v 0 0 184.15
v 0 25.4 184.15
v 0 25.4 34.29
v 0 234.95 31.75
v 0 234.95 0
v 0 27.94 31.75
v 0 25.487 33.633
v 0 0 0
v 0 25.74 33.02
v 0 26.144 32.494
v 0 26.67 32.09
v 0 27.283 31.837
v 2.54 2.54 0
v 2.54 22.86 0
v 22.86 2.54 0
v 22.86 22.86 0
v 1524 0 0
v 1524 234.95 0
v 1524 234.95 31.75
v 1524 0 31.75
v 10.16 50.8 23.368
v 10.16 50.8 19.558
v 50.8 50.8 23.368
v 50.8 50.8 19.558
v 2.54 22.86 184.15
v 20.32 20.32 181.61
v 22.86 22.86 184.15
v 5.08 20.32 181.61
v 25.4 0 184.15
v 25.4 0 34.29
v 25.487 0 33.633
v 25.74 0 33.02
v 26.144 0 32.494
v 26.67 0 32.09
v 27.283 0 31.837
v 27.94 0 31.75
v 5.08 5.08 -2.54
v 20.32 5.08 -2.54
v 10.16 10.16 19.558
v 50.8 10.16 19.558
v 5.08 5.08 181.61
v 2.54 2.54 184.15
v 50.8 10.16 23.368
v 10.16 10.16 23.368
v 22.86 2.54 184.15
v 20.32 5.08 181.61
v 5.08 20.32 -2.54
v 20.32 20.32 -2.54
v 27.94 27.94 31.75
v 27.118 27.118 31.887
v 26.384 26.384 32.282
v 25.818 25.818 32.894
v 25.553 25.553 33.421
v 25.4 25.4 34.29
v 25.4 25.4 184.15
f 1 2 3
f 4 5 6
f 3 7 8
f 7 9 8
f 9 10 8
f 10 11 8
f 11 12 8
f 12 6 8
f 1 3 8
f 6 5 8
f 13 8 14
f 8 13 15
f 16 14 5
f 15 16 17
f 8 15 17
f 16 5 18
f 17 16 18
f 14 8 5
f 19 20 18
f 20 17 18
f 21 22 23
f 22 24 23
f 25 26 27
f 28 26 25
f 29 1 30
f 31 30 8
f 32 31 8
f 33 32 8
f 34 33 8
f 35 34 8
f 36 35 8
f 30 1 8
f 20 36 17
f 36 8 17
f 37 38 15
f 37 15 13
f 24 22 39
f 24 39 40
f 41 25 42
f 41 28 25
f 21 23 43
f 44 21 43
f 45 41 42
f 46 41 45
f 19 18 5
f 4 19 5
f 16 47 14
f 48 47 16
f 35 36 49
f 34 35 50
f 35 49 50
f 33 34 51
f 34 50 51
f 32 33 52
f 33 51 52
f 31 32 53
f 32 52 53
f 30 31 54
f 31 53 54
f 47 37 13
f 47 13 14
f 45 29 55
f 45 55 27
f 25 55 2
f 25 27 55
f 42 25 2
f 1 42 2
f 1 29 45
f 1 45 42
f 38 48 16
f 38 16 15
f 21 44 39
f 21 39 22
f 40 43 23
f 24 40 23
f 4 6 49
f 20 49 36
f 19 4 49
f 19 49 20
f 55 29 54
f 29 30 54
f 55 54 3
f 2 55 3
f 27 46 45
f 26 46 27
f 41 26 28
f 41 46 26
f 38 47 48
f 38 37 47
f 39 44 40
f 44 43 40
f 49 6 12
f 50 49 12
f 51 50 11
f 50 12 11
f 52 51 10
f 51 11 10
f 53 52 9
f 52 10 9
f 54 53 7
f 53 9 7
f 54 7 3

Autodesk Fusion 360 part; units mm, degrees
sketch "Sketch1" plane through (0, 0, 0) normal (0, 0, 1) x (1, 0, 0)
  line L0 (0, 0) -> (50.8, 0)
  line L1 (50.8, 0) -> (50.8, 50.8)
  line L2 (50.8, 50.8) -> (0, 50.8)
  line L3 (0, 50.8) -> (0, 0)
  dimension "d1" = 50.8
  dimension "d2" = 50.8
extrude "Extrude1" add sketch "Sketch1" along normal blind 31.75
sketch "Sketch2" plane through (50.8, 0, 0) normal (1, 0, 0) x (0, 1, 0)
  line L0 (0, 0) -> (50.8, 0)
  line L1 (50.8, 0) -> (50.8, 31.75)
  line L2 (50.8, 31.75) -> (0, 31.75)
  line L3 (0, 31.75) -> (0, 0)
  line L4 (50.8, 23.368) -> (10.16, 23.368)
  line L5 (10.16, 23.368) -> (10.16, 3.81)
  line L6 (10.16, 3.81) -> (50.8, 3.81)
  line L7 (50.8, 3.81) -> (50.8, 23.368)
  dimension "d5" = 40.64
  dimension "d6" = 19.558
  dimension "d14" = 3.81
extrude "Extrude2" cut sketch "Sketch2" against normal blind 40.64 contours L1 L4 L5 L6 L7
sketch "Sketch3" plane through (0, 0, 31.75) normal (0, 0, 1) x (-1, 0, 0)
  line L0 (0, -50.8) -> (0, 0)
  line L1 (0, 0) -> (-50.8, 0)
  line L2 (-50.8, 0) -> (-50.8, -50.8)
  line L3 (-50.8, -50.8) -> (0, -50.8)
  line L4 (0, 0) -> (-25.4, 0)
  line L5 (-25.4, 0) -> (-25.4, -25.4)
  line L6 (-25.4, -25.4) -> (0, -25.4)
  line L7 (0, -25.4) -> (0, 0)
  dimension "d10" = 25.4
  dimension "d11" = 25.4
extrude "Extrude3" add sketch "Sketch3" along normal blind 152.4 contours L0 L1 L4 L5 L6 L7
fillet "Fillet1" radius 2.54 2 edges at (25.4, 12.7, 31.75) (12.7, 25.4, 31.75)
sketch "Sketch4" plane through (0, 0, 0) normal (0, 0, -1) x (1, 0, 0)
  line L0 (0, 0) -> (0, -50.8)
  line L1 (0, -50.8) -> (50.8, -50.8)
  line L2 (50.8, -50.8) -> (50.8, 0)
  line L3 (50.8, 0) -> (0, 0)
  line L4 (2.54, -2.54) -> (22.86, -2.54)
  line L5 (22.86, -2.54) -> (22.86, -22.86)
  line L6 (22.86, -22.86) -> (2.54, -22.86)
  line L7 (2.54, -22.86) -> (2.54, -2.54)
  dimension "d17" = 2.54
  dimension "d18" = 2.54
  dimension "d19" = 20.32
  dimension "d20" = 20.32
sketch "Sketch5" plane through (0, 0, 0) normal (0, 0, -1) x (1, 0, 0)
  line L0 (5.08, -5.08) -> (20.32, -5.08)
  line L1 (20.32, -5.08) -> (20.32, -20.32)
  line L2 (20.32, -20.32) -> (5.08, -20.32)
  line L3 (5.08, -20.32) -> (5.08, -5.08)
  line L4 (2.54, -2.54) -> (22.86, -2.54)
  line L5 (2.54, -22.86) -> (2.54, -2.54)
  dimension "d21" = 2.54
  dimension "d22" = 2.54
  dimension "d23" = 15.24
  dimension "d24" = 15.24
extrude "Extrude4" add sketch "Sketch5" along normal blind 2.54
loft "Loft1" add profiles "Sketch4" section 1 contours L4 L5 L6 L7 section 2 face at (10.16, 15.24, -2.54)
sketch "Sketch6" plane through (0, 0, 184.15) normal (0, 0, 1) x (-1, 0, 0)
  line L0 (0, -25.4) -> (0, 0)
  line L1 (0, 0) -> (-25.4, 0)
  line L2 (-25.4, 0) -> (-25.4, -25.4)
  line L3 (-25.4, -25.4) -> (0, -25.4)
  line L4 (-2.54, -22.86) -> (-22.86, -22.86)
  line L5 (-22.86, -22.86) -> (-22.86, -2.54)
  line L6 (-22.86, -2.54) -> (-2.54, -2.54)
  line L7 (-2.54, -2.54) -> (-2.54, -22.86)
  line L8 (-5.08, -20.32) -> (-20.32, -20.32)
  line L9 (-20.32, -20.32) -> (-20.32, -5.08)
  line L10 (-20.32, -5.08) -> (-5.08, -5.08)
  line L11 (-5.08, -5.08) -> (-5.08, -20.32)
  dimension "d27" = 2.54
  dimension "d28" = 2.54
  dimension "d29" = 2.54
  dimension "d30" = 20.32
  dimension "d31" = 2.54
  dimension "d32" = 15.24
  dimension "d33" = 15.24
  dimension "d34" = 2.54
extrude "Extrude5" cut sketch "Sketch6" against normal blind 2.54 contours L8 L9 L10 L11
loft "Loft2" cut profiles "Sketch6" section 1 contours L4 L5 L6 L7 section 2 face at (15.24, 15.24, 181.61)

Autodesk Fusion 360 part; units mm, degrees
sketch "Sketch1" plane through (0, 0, 0) normal (0, 0, 1) x (1, 0, 0)
  line L0 (0, 0) -> (1524, 0)
  line L1 (1524, 0) -> (1524, 234.95)
  line L2 (1524, 234.95) -> (0, 234.95)
  line L3 (0, 234.95) -> (0, 0)
  dimension "d1" = 234.95
  dimension "d2" = 1524
extrude "Extrude1" add sketch "Sketch1" along normal blind 19.558
